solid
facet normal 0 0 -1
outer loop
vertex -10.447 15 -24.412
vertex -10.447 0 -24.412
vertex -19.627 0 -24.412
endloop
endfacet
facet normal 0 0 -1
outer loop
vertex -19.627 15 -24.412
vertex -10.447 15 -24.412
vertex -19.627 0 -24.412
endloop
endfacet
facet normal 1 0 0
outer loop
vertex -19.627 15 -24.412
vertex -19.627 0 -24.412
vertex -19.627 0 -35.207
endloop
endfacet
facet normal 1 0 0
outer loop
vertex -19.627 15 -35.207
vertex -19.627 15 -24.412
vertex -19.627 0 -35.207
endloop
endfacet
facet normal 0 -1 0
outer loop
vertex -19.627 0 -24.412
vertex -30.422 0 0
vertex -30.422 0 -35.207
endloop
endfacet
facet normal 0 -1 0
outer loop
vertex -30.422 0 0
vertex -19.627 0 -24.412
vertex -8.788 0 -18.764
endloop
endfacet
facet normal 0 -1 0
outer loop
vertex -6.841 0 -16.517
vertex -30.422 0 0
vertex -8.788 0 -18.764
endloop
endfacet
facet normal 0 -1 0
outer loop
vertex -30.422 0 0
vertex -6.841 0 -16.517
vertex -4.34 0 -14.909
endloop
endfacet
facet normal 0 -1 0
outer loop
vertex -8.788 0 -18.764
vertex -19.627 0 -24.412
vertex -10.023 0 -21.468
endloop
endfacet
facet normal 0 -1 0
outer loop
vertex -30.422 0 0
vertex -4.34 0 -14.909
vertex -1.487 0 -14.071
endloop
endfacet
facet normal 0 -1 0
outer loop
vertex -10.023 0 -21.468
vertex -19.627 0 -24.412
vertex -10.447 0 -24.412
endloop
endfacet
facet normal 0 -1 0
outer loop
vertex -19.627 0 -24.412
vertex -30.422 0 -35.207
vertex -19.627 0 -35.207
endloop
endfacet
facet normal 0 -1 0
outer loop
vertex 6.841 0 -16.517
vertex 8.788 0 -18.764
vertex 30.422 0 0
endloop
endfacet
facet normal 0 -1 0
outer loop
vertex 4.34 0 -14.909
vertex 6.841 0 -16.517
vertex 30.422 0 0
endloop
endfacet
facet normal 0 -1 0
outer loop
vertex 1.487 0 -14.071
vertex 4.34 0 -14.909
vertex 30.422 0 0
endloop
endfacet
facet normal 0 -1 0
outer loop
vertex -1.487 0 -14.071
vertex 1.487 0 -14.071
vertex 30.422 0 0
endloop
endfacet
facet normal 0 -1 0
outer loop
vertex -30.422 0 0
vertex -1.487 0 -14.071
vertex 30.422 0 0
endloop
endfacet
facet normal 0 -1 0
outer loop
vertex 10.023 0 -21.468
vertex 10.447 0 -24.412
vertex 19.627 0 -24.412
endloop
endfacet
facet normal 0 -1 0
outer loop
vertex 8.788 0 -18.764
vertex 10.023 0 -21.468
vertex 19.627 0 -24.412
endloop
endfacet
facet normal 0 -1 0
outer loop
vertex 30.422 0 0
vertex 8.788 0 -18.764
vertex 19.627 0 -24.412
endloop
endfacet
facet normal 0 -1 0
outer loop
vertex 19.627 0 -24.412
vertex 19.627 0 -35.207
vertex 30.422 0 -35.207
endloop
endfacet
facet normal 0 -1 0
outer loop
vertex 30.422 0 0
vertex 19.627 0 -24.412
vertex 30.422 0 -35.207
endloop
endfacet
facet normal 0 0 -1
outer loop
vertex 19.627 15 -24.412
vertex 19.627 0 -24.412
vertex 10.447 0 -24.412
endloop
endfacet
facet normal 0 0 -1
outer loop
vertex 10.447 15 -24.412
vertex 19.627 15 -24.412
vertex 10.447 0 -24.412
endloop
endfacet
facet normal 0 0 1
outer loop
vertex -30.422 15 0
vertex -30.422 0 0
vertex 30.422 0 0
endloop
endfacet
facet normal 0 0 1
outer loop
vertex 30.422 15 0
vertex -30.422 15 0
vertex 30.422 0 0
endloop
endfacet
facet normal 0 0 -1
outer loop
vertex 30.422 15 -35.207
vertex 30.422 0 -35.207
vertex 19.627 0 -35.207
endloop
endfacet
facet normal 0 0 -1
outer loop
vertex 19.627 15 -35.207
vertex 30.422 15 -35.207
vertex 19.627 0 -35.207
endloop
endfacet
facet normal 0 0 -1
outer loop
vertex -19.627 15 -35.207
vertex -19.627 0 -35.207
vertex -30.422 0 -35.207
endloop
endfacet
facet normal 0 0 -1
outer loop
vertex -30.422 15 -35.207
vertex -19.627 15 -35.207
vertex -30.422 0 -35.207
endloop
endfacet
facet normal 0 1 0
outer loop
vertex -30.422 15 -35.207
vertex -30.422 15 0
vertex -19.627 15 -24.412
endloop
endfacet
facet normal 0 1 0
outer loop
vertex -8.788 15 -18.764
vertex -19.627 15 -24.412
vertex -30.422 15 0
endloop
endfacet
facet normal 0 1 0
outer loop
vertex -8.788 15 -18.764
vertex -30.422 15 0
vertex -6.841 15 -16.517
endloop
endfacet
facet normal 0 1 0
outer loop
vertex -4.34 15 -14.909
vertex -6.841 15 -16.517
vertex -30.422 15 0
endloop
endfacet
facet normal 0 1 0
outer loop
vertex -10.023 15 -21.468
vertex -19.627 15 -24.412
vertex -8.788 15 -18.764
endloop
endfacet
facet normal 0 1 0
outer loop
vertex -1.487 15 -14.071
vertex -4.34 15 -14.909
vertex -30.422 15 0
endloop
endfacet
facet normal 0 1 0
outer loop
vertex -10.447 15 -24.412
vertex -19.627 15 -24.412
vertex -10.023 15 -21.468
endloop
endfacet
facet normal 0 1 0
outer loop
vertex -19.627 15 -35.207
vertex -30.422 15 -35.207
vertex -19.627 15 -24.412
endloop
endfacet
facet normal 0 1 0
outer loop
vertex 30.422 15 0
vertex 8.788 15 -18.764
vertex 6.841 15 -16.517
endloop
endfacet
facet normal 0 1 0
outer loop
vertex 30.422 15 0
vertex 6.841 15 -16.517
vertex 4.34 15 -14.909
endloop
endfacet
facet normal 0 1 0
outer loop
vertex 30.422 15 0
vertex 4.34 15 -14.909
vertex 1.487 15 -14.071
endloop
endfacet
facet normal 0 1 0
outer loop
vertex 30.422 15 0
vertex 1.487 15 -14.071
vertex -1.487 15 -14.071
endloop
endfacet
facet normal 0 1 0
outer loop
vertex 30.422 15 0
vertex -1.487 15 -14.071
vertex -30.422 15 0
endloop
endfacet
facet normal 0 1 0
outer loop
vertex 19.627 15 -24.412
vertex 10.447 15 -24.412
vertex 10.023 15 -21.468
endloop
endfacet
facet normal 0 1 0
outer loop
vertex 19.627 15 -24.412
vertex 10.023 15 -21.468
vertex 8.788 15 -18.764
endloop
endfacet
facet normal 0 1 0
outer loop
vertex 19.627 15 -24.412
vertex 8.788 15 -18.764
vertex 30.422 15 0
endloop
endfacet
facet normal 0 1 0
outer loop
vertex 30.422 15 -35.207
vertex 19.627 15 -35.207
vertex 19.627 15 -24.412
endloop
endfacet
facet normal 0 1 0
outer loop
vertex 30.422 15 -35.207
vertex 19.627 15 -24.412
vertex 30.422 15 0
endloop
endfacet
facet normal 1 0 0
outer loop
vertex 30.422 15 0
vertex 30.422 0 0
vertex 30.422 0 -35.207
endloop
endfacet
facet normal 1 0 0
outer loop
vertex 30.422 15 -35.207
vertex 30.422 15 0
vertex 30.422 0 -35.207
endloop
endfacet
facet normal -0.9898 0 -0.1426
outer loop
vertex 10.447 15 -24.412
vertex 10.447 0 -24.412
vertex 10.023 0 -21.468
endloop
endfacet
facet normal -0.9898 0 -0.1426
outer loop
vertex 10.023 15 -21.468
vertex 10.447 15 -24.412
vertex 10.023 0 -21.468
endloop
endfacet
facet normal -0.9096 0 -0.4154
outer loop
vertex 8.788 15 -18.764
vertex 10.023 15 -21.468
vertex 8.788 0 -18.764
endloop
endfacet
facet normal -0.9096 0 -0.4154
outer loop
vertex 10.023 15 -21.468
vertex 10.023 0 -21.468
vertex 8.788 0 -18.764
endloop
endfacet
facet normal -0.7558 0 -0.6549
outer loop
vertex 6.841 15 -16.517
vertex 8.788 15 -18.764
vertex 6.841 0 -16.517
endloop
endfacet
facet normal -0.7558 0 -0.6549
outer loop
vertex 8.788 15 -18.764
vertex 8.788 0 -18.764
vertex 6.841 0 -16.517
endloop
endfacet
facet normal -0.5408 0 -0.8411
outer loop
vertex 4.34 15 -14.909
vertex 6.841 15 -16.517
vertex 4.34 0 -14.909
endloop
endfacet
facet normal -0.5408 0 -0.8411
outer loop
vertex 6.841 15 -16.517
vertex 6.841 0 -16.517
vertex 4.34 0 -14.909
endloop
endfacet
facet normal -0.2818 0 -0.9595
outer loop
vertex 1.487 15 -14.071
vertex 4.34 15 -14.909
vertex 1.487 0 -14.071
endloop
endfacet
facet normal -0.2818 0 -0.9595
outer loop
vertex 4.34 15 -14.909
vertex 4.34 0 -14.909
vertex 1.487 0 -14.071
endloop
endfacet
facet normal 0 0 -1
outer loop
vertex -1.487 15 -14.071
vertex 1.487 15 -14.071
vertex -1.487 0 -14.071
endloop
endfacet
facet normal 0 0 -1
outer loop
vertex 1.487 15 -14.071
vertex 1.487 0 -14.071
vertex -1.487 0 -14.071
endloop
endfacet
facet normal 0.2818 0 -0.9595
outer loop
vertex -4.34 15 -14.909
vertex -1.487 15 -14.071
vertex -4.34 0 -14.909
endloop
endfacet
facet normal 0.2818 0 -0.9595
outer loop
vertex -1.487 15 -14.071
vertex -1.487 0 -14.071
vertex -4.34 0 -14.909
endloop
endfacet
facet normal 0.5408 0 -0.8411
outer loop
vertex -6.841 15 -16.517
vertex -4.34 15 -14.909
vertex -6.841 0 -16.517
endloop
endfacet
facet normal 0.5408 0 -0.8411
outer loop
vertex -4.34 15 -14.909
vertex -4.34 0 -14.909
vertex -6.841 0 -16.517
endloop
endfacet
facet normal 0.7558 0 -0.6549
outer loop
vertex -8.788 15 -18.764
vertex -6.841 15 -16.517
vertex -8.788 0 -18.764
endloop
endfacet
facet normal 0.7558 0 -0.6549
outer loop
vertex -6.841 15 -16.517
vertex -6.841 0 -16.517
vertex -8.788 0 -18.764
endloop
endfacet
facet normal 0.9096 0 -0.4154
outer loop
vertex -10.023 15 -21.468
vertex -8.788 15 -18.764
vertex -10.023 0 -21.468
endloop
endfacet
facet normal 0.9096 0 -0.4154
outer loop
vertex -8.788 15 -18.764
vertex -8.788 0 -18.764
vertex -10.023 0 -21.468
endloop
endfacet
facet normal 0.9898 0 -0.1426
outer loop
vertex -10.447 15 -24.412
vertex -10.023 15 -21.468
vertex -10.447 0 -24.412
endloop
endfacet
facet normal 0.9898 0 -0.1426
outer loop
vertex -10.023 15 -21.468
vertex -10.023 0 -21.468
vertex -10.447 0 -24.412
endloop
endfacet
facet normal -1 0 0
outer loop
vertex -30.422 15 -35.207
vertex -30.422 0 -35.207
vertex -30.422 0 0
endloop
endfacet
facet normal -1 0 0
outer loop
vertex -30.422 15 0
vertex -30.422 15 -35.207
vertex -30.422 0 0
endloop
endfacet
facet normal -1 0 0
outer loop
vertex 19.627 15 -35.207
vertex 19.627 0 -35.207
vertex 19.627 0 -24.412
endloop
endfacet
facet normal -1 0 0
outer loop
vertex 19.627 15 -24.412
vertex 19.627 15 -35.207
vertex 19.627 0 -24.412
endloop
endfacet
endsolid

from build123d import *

# Parameters (mm, degrees)
BOSS_EXTRUDE1_DEPTH = 15


with BuildPart() as part:
    # Sketch4 → Boss-Extrude1 (new body)
    with BuildSketch(Plane(origin=(0, 0, 0), x_dir=(1, 0, 0), z_dir=(0, 1, 0))):
        with BuildLine():
            Line((-30.42245721, 0), (30.42245721, 0))
            Line((30.42245721, 0), (30.42245721, 35.206633949))
            Line((30.42245721, 35.206633949), (19.627391749, 35.206633949))
            Line((19.627391749, 35.206633949), (19.627391749, 24.411568487))
            Line((19.627391749, 24.411568487), (10.446516771, 24.411568487))
            ThreePointArc((10.446516771, 24.411568487), (0, 13.965051717), (-10.446516771, 24.411568487))
            Line((-10.446516771, 24.411568487), (-19.627391749, 24.411568487))
            Line((-19.627391749, 24.411568487), (-19.627391749, 35.206633949))
            Line((-19.627391749, 35.206633949), (-30.42245721, 35.206633949))
            Line((-30.42245721, 35.206633949), (-30.42245721, 0))
        make_face()
    extrude(amount=BOSS_EXTRUDE1_DEPTH)


solid = part.part
